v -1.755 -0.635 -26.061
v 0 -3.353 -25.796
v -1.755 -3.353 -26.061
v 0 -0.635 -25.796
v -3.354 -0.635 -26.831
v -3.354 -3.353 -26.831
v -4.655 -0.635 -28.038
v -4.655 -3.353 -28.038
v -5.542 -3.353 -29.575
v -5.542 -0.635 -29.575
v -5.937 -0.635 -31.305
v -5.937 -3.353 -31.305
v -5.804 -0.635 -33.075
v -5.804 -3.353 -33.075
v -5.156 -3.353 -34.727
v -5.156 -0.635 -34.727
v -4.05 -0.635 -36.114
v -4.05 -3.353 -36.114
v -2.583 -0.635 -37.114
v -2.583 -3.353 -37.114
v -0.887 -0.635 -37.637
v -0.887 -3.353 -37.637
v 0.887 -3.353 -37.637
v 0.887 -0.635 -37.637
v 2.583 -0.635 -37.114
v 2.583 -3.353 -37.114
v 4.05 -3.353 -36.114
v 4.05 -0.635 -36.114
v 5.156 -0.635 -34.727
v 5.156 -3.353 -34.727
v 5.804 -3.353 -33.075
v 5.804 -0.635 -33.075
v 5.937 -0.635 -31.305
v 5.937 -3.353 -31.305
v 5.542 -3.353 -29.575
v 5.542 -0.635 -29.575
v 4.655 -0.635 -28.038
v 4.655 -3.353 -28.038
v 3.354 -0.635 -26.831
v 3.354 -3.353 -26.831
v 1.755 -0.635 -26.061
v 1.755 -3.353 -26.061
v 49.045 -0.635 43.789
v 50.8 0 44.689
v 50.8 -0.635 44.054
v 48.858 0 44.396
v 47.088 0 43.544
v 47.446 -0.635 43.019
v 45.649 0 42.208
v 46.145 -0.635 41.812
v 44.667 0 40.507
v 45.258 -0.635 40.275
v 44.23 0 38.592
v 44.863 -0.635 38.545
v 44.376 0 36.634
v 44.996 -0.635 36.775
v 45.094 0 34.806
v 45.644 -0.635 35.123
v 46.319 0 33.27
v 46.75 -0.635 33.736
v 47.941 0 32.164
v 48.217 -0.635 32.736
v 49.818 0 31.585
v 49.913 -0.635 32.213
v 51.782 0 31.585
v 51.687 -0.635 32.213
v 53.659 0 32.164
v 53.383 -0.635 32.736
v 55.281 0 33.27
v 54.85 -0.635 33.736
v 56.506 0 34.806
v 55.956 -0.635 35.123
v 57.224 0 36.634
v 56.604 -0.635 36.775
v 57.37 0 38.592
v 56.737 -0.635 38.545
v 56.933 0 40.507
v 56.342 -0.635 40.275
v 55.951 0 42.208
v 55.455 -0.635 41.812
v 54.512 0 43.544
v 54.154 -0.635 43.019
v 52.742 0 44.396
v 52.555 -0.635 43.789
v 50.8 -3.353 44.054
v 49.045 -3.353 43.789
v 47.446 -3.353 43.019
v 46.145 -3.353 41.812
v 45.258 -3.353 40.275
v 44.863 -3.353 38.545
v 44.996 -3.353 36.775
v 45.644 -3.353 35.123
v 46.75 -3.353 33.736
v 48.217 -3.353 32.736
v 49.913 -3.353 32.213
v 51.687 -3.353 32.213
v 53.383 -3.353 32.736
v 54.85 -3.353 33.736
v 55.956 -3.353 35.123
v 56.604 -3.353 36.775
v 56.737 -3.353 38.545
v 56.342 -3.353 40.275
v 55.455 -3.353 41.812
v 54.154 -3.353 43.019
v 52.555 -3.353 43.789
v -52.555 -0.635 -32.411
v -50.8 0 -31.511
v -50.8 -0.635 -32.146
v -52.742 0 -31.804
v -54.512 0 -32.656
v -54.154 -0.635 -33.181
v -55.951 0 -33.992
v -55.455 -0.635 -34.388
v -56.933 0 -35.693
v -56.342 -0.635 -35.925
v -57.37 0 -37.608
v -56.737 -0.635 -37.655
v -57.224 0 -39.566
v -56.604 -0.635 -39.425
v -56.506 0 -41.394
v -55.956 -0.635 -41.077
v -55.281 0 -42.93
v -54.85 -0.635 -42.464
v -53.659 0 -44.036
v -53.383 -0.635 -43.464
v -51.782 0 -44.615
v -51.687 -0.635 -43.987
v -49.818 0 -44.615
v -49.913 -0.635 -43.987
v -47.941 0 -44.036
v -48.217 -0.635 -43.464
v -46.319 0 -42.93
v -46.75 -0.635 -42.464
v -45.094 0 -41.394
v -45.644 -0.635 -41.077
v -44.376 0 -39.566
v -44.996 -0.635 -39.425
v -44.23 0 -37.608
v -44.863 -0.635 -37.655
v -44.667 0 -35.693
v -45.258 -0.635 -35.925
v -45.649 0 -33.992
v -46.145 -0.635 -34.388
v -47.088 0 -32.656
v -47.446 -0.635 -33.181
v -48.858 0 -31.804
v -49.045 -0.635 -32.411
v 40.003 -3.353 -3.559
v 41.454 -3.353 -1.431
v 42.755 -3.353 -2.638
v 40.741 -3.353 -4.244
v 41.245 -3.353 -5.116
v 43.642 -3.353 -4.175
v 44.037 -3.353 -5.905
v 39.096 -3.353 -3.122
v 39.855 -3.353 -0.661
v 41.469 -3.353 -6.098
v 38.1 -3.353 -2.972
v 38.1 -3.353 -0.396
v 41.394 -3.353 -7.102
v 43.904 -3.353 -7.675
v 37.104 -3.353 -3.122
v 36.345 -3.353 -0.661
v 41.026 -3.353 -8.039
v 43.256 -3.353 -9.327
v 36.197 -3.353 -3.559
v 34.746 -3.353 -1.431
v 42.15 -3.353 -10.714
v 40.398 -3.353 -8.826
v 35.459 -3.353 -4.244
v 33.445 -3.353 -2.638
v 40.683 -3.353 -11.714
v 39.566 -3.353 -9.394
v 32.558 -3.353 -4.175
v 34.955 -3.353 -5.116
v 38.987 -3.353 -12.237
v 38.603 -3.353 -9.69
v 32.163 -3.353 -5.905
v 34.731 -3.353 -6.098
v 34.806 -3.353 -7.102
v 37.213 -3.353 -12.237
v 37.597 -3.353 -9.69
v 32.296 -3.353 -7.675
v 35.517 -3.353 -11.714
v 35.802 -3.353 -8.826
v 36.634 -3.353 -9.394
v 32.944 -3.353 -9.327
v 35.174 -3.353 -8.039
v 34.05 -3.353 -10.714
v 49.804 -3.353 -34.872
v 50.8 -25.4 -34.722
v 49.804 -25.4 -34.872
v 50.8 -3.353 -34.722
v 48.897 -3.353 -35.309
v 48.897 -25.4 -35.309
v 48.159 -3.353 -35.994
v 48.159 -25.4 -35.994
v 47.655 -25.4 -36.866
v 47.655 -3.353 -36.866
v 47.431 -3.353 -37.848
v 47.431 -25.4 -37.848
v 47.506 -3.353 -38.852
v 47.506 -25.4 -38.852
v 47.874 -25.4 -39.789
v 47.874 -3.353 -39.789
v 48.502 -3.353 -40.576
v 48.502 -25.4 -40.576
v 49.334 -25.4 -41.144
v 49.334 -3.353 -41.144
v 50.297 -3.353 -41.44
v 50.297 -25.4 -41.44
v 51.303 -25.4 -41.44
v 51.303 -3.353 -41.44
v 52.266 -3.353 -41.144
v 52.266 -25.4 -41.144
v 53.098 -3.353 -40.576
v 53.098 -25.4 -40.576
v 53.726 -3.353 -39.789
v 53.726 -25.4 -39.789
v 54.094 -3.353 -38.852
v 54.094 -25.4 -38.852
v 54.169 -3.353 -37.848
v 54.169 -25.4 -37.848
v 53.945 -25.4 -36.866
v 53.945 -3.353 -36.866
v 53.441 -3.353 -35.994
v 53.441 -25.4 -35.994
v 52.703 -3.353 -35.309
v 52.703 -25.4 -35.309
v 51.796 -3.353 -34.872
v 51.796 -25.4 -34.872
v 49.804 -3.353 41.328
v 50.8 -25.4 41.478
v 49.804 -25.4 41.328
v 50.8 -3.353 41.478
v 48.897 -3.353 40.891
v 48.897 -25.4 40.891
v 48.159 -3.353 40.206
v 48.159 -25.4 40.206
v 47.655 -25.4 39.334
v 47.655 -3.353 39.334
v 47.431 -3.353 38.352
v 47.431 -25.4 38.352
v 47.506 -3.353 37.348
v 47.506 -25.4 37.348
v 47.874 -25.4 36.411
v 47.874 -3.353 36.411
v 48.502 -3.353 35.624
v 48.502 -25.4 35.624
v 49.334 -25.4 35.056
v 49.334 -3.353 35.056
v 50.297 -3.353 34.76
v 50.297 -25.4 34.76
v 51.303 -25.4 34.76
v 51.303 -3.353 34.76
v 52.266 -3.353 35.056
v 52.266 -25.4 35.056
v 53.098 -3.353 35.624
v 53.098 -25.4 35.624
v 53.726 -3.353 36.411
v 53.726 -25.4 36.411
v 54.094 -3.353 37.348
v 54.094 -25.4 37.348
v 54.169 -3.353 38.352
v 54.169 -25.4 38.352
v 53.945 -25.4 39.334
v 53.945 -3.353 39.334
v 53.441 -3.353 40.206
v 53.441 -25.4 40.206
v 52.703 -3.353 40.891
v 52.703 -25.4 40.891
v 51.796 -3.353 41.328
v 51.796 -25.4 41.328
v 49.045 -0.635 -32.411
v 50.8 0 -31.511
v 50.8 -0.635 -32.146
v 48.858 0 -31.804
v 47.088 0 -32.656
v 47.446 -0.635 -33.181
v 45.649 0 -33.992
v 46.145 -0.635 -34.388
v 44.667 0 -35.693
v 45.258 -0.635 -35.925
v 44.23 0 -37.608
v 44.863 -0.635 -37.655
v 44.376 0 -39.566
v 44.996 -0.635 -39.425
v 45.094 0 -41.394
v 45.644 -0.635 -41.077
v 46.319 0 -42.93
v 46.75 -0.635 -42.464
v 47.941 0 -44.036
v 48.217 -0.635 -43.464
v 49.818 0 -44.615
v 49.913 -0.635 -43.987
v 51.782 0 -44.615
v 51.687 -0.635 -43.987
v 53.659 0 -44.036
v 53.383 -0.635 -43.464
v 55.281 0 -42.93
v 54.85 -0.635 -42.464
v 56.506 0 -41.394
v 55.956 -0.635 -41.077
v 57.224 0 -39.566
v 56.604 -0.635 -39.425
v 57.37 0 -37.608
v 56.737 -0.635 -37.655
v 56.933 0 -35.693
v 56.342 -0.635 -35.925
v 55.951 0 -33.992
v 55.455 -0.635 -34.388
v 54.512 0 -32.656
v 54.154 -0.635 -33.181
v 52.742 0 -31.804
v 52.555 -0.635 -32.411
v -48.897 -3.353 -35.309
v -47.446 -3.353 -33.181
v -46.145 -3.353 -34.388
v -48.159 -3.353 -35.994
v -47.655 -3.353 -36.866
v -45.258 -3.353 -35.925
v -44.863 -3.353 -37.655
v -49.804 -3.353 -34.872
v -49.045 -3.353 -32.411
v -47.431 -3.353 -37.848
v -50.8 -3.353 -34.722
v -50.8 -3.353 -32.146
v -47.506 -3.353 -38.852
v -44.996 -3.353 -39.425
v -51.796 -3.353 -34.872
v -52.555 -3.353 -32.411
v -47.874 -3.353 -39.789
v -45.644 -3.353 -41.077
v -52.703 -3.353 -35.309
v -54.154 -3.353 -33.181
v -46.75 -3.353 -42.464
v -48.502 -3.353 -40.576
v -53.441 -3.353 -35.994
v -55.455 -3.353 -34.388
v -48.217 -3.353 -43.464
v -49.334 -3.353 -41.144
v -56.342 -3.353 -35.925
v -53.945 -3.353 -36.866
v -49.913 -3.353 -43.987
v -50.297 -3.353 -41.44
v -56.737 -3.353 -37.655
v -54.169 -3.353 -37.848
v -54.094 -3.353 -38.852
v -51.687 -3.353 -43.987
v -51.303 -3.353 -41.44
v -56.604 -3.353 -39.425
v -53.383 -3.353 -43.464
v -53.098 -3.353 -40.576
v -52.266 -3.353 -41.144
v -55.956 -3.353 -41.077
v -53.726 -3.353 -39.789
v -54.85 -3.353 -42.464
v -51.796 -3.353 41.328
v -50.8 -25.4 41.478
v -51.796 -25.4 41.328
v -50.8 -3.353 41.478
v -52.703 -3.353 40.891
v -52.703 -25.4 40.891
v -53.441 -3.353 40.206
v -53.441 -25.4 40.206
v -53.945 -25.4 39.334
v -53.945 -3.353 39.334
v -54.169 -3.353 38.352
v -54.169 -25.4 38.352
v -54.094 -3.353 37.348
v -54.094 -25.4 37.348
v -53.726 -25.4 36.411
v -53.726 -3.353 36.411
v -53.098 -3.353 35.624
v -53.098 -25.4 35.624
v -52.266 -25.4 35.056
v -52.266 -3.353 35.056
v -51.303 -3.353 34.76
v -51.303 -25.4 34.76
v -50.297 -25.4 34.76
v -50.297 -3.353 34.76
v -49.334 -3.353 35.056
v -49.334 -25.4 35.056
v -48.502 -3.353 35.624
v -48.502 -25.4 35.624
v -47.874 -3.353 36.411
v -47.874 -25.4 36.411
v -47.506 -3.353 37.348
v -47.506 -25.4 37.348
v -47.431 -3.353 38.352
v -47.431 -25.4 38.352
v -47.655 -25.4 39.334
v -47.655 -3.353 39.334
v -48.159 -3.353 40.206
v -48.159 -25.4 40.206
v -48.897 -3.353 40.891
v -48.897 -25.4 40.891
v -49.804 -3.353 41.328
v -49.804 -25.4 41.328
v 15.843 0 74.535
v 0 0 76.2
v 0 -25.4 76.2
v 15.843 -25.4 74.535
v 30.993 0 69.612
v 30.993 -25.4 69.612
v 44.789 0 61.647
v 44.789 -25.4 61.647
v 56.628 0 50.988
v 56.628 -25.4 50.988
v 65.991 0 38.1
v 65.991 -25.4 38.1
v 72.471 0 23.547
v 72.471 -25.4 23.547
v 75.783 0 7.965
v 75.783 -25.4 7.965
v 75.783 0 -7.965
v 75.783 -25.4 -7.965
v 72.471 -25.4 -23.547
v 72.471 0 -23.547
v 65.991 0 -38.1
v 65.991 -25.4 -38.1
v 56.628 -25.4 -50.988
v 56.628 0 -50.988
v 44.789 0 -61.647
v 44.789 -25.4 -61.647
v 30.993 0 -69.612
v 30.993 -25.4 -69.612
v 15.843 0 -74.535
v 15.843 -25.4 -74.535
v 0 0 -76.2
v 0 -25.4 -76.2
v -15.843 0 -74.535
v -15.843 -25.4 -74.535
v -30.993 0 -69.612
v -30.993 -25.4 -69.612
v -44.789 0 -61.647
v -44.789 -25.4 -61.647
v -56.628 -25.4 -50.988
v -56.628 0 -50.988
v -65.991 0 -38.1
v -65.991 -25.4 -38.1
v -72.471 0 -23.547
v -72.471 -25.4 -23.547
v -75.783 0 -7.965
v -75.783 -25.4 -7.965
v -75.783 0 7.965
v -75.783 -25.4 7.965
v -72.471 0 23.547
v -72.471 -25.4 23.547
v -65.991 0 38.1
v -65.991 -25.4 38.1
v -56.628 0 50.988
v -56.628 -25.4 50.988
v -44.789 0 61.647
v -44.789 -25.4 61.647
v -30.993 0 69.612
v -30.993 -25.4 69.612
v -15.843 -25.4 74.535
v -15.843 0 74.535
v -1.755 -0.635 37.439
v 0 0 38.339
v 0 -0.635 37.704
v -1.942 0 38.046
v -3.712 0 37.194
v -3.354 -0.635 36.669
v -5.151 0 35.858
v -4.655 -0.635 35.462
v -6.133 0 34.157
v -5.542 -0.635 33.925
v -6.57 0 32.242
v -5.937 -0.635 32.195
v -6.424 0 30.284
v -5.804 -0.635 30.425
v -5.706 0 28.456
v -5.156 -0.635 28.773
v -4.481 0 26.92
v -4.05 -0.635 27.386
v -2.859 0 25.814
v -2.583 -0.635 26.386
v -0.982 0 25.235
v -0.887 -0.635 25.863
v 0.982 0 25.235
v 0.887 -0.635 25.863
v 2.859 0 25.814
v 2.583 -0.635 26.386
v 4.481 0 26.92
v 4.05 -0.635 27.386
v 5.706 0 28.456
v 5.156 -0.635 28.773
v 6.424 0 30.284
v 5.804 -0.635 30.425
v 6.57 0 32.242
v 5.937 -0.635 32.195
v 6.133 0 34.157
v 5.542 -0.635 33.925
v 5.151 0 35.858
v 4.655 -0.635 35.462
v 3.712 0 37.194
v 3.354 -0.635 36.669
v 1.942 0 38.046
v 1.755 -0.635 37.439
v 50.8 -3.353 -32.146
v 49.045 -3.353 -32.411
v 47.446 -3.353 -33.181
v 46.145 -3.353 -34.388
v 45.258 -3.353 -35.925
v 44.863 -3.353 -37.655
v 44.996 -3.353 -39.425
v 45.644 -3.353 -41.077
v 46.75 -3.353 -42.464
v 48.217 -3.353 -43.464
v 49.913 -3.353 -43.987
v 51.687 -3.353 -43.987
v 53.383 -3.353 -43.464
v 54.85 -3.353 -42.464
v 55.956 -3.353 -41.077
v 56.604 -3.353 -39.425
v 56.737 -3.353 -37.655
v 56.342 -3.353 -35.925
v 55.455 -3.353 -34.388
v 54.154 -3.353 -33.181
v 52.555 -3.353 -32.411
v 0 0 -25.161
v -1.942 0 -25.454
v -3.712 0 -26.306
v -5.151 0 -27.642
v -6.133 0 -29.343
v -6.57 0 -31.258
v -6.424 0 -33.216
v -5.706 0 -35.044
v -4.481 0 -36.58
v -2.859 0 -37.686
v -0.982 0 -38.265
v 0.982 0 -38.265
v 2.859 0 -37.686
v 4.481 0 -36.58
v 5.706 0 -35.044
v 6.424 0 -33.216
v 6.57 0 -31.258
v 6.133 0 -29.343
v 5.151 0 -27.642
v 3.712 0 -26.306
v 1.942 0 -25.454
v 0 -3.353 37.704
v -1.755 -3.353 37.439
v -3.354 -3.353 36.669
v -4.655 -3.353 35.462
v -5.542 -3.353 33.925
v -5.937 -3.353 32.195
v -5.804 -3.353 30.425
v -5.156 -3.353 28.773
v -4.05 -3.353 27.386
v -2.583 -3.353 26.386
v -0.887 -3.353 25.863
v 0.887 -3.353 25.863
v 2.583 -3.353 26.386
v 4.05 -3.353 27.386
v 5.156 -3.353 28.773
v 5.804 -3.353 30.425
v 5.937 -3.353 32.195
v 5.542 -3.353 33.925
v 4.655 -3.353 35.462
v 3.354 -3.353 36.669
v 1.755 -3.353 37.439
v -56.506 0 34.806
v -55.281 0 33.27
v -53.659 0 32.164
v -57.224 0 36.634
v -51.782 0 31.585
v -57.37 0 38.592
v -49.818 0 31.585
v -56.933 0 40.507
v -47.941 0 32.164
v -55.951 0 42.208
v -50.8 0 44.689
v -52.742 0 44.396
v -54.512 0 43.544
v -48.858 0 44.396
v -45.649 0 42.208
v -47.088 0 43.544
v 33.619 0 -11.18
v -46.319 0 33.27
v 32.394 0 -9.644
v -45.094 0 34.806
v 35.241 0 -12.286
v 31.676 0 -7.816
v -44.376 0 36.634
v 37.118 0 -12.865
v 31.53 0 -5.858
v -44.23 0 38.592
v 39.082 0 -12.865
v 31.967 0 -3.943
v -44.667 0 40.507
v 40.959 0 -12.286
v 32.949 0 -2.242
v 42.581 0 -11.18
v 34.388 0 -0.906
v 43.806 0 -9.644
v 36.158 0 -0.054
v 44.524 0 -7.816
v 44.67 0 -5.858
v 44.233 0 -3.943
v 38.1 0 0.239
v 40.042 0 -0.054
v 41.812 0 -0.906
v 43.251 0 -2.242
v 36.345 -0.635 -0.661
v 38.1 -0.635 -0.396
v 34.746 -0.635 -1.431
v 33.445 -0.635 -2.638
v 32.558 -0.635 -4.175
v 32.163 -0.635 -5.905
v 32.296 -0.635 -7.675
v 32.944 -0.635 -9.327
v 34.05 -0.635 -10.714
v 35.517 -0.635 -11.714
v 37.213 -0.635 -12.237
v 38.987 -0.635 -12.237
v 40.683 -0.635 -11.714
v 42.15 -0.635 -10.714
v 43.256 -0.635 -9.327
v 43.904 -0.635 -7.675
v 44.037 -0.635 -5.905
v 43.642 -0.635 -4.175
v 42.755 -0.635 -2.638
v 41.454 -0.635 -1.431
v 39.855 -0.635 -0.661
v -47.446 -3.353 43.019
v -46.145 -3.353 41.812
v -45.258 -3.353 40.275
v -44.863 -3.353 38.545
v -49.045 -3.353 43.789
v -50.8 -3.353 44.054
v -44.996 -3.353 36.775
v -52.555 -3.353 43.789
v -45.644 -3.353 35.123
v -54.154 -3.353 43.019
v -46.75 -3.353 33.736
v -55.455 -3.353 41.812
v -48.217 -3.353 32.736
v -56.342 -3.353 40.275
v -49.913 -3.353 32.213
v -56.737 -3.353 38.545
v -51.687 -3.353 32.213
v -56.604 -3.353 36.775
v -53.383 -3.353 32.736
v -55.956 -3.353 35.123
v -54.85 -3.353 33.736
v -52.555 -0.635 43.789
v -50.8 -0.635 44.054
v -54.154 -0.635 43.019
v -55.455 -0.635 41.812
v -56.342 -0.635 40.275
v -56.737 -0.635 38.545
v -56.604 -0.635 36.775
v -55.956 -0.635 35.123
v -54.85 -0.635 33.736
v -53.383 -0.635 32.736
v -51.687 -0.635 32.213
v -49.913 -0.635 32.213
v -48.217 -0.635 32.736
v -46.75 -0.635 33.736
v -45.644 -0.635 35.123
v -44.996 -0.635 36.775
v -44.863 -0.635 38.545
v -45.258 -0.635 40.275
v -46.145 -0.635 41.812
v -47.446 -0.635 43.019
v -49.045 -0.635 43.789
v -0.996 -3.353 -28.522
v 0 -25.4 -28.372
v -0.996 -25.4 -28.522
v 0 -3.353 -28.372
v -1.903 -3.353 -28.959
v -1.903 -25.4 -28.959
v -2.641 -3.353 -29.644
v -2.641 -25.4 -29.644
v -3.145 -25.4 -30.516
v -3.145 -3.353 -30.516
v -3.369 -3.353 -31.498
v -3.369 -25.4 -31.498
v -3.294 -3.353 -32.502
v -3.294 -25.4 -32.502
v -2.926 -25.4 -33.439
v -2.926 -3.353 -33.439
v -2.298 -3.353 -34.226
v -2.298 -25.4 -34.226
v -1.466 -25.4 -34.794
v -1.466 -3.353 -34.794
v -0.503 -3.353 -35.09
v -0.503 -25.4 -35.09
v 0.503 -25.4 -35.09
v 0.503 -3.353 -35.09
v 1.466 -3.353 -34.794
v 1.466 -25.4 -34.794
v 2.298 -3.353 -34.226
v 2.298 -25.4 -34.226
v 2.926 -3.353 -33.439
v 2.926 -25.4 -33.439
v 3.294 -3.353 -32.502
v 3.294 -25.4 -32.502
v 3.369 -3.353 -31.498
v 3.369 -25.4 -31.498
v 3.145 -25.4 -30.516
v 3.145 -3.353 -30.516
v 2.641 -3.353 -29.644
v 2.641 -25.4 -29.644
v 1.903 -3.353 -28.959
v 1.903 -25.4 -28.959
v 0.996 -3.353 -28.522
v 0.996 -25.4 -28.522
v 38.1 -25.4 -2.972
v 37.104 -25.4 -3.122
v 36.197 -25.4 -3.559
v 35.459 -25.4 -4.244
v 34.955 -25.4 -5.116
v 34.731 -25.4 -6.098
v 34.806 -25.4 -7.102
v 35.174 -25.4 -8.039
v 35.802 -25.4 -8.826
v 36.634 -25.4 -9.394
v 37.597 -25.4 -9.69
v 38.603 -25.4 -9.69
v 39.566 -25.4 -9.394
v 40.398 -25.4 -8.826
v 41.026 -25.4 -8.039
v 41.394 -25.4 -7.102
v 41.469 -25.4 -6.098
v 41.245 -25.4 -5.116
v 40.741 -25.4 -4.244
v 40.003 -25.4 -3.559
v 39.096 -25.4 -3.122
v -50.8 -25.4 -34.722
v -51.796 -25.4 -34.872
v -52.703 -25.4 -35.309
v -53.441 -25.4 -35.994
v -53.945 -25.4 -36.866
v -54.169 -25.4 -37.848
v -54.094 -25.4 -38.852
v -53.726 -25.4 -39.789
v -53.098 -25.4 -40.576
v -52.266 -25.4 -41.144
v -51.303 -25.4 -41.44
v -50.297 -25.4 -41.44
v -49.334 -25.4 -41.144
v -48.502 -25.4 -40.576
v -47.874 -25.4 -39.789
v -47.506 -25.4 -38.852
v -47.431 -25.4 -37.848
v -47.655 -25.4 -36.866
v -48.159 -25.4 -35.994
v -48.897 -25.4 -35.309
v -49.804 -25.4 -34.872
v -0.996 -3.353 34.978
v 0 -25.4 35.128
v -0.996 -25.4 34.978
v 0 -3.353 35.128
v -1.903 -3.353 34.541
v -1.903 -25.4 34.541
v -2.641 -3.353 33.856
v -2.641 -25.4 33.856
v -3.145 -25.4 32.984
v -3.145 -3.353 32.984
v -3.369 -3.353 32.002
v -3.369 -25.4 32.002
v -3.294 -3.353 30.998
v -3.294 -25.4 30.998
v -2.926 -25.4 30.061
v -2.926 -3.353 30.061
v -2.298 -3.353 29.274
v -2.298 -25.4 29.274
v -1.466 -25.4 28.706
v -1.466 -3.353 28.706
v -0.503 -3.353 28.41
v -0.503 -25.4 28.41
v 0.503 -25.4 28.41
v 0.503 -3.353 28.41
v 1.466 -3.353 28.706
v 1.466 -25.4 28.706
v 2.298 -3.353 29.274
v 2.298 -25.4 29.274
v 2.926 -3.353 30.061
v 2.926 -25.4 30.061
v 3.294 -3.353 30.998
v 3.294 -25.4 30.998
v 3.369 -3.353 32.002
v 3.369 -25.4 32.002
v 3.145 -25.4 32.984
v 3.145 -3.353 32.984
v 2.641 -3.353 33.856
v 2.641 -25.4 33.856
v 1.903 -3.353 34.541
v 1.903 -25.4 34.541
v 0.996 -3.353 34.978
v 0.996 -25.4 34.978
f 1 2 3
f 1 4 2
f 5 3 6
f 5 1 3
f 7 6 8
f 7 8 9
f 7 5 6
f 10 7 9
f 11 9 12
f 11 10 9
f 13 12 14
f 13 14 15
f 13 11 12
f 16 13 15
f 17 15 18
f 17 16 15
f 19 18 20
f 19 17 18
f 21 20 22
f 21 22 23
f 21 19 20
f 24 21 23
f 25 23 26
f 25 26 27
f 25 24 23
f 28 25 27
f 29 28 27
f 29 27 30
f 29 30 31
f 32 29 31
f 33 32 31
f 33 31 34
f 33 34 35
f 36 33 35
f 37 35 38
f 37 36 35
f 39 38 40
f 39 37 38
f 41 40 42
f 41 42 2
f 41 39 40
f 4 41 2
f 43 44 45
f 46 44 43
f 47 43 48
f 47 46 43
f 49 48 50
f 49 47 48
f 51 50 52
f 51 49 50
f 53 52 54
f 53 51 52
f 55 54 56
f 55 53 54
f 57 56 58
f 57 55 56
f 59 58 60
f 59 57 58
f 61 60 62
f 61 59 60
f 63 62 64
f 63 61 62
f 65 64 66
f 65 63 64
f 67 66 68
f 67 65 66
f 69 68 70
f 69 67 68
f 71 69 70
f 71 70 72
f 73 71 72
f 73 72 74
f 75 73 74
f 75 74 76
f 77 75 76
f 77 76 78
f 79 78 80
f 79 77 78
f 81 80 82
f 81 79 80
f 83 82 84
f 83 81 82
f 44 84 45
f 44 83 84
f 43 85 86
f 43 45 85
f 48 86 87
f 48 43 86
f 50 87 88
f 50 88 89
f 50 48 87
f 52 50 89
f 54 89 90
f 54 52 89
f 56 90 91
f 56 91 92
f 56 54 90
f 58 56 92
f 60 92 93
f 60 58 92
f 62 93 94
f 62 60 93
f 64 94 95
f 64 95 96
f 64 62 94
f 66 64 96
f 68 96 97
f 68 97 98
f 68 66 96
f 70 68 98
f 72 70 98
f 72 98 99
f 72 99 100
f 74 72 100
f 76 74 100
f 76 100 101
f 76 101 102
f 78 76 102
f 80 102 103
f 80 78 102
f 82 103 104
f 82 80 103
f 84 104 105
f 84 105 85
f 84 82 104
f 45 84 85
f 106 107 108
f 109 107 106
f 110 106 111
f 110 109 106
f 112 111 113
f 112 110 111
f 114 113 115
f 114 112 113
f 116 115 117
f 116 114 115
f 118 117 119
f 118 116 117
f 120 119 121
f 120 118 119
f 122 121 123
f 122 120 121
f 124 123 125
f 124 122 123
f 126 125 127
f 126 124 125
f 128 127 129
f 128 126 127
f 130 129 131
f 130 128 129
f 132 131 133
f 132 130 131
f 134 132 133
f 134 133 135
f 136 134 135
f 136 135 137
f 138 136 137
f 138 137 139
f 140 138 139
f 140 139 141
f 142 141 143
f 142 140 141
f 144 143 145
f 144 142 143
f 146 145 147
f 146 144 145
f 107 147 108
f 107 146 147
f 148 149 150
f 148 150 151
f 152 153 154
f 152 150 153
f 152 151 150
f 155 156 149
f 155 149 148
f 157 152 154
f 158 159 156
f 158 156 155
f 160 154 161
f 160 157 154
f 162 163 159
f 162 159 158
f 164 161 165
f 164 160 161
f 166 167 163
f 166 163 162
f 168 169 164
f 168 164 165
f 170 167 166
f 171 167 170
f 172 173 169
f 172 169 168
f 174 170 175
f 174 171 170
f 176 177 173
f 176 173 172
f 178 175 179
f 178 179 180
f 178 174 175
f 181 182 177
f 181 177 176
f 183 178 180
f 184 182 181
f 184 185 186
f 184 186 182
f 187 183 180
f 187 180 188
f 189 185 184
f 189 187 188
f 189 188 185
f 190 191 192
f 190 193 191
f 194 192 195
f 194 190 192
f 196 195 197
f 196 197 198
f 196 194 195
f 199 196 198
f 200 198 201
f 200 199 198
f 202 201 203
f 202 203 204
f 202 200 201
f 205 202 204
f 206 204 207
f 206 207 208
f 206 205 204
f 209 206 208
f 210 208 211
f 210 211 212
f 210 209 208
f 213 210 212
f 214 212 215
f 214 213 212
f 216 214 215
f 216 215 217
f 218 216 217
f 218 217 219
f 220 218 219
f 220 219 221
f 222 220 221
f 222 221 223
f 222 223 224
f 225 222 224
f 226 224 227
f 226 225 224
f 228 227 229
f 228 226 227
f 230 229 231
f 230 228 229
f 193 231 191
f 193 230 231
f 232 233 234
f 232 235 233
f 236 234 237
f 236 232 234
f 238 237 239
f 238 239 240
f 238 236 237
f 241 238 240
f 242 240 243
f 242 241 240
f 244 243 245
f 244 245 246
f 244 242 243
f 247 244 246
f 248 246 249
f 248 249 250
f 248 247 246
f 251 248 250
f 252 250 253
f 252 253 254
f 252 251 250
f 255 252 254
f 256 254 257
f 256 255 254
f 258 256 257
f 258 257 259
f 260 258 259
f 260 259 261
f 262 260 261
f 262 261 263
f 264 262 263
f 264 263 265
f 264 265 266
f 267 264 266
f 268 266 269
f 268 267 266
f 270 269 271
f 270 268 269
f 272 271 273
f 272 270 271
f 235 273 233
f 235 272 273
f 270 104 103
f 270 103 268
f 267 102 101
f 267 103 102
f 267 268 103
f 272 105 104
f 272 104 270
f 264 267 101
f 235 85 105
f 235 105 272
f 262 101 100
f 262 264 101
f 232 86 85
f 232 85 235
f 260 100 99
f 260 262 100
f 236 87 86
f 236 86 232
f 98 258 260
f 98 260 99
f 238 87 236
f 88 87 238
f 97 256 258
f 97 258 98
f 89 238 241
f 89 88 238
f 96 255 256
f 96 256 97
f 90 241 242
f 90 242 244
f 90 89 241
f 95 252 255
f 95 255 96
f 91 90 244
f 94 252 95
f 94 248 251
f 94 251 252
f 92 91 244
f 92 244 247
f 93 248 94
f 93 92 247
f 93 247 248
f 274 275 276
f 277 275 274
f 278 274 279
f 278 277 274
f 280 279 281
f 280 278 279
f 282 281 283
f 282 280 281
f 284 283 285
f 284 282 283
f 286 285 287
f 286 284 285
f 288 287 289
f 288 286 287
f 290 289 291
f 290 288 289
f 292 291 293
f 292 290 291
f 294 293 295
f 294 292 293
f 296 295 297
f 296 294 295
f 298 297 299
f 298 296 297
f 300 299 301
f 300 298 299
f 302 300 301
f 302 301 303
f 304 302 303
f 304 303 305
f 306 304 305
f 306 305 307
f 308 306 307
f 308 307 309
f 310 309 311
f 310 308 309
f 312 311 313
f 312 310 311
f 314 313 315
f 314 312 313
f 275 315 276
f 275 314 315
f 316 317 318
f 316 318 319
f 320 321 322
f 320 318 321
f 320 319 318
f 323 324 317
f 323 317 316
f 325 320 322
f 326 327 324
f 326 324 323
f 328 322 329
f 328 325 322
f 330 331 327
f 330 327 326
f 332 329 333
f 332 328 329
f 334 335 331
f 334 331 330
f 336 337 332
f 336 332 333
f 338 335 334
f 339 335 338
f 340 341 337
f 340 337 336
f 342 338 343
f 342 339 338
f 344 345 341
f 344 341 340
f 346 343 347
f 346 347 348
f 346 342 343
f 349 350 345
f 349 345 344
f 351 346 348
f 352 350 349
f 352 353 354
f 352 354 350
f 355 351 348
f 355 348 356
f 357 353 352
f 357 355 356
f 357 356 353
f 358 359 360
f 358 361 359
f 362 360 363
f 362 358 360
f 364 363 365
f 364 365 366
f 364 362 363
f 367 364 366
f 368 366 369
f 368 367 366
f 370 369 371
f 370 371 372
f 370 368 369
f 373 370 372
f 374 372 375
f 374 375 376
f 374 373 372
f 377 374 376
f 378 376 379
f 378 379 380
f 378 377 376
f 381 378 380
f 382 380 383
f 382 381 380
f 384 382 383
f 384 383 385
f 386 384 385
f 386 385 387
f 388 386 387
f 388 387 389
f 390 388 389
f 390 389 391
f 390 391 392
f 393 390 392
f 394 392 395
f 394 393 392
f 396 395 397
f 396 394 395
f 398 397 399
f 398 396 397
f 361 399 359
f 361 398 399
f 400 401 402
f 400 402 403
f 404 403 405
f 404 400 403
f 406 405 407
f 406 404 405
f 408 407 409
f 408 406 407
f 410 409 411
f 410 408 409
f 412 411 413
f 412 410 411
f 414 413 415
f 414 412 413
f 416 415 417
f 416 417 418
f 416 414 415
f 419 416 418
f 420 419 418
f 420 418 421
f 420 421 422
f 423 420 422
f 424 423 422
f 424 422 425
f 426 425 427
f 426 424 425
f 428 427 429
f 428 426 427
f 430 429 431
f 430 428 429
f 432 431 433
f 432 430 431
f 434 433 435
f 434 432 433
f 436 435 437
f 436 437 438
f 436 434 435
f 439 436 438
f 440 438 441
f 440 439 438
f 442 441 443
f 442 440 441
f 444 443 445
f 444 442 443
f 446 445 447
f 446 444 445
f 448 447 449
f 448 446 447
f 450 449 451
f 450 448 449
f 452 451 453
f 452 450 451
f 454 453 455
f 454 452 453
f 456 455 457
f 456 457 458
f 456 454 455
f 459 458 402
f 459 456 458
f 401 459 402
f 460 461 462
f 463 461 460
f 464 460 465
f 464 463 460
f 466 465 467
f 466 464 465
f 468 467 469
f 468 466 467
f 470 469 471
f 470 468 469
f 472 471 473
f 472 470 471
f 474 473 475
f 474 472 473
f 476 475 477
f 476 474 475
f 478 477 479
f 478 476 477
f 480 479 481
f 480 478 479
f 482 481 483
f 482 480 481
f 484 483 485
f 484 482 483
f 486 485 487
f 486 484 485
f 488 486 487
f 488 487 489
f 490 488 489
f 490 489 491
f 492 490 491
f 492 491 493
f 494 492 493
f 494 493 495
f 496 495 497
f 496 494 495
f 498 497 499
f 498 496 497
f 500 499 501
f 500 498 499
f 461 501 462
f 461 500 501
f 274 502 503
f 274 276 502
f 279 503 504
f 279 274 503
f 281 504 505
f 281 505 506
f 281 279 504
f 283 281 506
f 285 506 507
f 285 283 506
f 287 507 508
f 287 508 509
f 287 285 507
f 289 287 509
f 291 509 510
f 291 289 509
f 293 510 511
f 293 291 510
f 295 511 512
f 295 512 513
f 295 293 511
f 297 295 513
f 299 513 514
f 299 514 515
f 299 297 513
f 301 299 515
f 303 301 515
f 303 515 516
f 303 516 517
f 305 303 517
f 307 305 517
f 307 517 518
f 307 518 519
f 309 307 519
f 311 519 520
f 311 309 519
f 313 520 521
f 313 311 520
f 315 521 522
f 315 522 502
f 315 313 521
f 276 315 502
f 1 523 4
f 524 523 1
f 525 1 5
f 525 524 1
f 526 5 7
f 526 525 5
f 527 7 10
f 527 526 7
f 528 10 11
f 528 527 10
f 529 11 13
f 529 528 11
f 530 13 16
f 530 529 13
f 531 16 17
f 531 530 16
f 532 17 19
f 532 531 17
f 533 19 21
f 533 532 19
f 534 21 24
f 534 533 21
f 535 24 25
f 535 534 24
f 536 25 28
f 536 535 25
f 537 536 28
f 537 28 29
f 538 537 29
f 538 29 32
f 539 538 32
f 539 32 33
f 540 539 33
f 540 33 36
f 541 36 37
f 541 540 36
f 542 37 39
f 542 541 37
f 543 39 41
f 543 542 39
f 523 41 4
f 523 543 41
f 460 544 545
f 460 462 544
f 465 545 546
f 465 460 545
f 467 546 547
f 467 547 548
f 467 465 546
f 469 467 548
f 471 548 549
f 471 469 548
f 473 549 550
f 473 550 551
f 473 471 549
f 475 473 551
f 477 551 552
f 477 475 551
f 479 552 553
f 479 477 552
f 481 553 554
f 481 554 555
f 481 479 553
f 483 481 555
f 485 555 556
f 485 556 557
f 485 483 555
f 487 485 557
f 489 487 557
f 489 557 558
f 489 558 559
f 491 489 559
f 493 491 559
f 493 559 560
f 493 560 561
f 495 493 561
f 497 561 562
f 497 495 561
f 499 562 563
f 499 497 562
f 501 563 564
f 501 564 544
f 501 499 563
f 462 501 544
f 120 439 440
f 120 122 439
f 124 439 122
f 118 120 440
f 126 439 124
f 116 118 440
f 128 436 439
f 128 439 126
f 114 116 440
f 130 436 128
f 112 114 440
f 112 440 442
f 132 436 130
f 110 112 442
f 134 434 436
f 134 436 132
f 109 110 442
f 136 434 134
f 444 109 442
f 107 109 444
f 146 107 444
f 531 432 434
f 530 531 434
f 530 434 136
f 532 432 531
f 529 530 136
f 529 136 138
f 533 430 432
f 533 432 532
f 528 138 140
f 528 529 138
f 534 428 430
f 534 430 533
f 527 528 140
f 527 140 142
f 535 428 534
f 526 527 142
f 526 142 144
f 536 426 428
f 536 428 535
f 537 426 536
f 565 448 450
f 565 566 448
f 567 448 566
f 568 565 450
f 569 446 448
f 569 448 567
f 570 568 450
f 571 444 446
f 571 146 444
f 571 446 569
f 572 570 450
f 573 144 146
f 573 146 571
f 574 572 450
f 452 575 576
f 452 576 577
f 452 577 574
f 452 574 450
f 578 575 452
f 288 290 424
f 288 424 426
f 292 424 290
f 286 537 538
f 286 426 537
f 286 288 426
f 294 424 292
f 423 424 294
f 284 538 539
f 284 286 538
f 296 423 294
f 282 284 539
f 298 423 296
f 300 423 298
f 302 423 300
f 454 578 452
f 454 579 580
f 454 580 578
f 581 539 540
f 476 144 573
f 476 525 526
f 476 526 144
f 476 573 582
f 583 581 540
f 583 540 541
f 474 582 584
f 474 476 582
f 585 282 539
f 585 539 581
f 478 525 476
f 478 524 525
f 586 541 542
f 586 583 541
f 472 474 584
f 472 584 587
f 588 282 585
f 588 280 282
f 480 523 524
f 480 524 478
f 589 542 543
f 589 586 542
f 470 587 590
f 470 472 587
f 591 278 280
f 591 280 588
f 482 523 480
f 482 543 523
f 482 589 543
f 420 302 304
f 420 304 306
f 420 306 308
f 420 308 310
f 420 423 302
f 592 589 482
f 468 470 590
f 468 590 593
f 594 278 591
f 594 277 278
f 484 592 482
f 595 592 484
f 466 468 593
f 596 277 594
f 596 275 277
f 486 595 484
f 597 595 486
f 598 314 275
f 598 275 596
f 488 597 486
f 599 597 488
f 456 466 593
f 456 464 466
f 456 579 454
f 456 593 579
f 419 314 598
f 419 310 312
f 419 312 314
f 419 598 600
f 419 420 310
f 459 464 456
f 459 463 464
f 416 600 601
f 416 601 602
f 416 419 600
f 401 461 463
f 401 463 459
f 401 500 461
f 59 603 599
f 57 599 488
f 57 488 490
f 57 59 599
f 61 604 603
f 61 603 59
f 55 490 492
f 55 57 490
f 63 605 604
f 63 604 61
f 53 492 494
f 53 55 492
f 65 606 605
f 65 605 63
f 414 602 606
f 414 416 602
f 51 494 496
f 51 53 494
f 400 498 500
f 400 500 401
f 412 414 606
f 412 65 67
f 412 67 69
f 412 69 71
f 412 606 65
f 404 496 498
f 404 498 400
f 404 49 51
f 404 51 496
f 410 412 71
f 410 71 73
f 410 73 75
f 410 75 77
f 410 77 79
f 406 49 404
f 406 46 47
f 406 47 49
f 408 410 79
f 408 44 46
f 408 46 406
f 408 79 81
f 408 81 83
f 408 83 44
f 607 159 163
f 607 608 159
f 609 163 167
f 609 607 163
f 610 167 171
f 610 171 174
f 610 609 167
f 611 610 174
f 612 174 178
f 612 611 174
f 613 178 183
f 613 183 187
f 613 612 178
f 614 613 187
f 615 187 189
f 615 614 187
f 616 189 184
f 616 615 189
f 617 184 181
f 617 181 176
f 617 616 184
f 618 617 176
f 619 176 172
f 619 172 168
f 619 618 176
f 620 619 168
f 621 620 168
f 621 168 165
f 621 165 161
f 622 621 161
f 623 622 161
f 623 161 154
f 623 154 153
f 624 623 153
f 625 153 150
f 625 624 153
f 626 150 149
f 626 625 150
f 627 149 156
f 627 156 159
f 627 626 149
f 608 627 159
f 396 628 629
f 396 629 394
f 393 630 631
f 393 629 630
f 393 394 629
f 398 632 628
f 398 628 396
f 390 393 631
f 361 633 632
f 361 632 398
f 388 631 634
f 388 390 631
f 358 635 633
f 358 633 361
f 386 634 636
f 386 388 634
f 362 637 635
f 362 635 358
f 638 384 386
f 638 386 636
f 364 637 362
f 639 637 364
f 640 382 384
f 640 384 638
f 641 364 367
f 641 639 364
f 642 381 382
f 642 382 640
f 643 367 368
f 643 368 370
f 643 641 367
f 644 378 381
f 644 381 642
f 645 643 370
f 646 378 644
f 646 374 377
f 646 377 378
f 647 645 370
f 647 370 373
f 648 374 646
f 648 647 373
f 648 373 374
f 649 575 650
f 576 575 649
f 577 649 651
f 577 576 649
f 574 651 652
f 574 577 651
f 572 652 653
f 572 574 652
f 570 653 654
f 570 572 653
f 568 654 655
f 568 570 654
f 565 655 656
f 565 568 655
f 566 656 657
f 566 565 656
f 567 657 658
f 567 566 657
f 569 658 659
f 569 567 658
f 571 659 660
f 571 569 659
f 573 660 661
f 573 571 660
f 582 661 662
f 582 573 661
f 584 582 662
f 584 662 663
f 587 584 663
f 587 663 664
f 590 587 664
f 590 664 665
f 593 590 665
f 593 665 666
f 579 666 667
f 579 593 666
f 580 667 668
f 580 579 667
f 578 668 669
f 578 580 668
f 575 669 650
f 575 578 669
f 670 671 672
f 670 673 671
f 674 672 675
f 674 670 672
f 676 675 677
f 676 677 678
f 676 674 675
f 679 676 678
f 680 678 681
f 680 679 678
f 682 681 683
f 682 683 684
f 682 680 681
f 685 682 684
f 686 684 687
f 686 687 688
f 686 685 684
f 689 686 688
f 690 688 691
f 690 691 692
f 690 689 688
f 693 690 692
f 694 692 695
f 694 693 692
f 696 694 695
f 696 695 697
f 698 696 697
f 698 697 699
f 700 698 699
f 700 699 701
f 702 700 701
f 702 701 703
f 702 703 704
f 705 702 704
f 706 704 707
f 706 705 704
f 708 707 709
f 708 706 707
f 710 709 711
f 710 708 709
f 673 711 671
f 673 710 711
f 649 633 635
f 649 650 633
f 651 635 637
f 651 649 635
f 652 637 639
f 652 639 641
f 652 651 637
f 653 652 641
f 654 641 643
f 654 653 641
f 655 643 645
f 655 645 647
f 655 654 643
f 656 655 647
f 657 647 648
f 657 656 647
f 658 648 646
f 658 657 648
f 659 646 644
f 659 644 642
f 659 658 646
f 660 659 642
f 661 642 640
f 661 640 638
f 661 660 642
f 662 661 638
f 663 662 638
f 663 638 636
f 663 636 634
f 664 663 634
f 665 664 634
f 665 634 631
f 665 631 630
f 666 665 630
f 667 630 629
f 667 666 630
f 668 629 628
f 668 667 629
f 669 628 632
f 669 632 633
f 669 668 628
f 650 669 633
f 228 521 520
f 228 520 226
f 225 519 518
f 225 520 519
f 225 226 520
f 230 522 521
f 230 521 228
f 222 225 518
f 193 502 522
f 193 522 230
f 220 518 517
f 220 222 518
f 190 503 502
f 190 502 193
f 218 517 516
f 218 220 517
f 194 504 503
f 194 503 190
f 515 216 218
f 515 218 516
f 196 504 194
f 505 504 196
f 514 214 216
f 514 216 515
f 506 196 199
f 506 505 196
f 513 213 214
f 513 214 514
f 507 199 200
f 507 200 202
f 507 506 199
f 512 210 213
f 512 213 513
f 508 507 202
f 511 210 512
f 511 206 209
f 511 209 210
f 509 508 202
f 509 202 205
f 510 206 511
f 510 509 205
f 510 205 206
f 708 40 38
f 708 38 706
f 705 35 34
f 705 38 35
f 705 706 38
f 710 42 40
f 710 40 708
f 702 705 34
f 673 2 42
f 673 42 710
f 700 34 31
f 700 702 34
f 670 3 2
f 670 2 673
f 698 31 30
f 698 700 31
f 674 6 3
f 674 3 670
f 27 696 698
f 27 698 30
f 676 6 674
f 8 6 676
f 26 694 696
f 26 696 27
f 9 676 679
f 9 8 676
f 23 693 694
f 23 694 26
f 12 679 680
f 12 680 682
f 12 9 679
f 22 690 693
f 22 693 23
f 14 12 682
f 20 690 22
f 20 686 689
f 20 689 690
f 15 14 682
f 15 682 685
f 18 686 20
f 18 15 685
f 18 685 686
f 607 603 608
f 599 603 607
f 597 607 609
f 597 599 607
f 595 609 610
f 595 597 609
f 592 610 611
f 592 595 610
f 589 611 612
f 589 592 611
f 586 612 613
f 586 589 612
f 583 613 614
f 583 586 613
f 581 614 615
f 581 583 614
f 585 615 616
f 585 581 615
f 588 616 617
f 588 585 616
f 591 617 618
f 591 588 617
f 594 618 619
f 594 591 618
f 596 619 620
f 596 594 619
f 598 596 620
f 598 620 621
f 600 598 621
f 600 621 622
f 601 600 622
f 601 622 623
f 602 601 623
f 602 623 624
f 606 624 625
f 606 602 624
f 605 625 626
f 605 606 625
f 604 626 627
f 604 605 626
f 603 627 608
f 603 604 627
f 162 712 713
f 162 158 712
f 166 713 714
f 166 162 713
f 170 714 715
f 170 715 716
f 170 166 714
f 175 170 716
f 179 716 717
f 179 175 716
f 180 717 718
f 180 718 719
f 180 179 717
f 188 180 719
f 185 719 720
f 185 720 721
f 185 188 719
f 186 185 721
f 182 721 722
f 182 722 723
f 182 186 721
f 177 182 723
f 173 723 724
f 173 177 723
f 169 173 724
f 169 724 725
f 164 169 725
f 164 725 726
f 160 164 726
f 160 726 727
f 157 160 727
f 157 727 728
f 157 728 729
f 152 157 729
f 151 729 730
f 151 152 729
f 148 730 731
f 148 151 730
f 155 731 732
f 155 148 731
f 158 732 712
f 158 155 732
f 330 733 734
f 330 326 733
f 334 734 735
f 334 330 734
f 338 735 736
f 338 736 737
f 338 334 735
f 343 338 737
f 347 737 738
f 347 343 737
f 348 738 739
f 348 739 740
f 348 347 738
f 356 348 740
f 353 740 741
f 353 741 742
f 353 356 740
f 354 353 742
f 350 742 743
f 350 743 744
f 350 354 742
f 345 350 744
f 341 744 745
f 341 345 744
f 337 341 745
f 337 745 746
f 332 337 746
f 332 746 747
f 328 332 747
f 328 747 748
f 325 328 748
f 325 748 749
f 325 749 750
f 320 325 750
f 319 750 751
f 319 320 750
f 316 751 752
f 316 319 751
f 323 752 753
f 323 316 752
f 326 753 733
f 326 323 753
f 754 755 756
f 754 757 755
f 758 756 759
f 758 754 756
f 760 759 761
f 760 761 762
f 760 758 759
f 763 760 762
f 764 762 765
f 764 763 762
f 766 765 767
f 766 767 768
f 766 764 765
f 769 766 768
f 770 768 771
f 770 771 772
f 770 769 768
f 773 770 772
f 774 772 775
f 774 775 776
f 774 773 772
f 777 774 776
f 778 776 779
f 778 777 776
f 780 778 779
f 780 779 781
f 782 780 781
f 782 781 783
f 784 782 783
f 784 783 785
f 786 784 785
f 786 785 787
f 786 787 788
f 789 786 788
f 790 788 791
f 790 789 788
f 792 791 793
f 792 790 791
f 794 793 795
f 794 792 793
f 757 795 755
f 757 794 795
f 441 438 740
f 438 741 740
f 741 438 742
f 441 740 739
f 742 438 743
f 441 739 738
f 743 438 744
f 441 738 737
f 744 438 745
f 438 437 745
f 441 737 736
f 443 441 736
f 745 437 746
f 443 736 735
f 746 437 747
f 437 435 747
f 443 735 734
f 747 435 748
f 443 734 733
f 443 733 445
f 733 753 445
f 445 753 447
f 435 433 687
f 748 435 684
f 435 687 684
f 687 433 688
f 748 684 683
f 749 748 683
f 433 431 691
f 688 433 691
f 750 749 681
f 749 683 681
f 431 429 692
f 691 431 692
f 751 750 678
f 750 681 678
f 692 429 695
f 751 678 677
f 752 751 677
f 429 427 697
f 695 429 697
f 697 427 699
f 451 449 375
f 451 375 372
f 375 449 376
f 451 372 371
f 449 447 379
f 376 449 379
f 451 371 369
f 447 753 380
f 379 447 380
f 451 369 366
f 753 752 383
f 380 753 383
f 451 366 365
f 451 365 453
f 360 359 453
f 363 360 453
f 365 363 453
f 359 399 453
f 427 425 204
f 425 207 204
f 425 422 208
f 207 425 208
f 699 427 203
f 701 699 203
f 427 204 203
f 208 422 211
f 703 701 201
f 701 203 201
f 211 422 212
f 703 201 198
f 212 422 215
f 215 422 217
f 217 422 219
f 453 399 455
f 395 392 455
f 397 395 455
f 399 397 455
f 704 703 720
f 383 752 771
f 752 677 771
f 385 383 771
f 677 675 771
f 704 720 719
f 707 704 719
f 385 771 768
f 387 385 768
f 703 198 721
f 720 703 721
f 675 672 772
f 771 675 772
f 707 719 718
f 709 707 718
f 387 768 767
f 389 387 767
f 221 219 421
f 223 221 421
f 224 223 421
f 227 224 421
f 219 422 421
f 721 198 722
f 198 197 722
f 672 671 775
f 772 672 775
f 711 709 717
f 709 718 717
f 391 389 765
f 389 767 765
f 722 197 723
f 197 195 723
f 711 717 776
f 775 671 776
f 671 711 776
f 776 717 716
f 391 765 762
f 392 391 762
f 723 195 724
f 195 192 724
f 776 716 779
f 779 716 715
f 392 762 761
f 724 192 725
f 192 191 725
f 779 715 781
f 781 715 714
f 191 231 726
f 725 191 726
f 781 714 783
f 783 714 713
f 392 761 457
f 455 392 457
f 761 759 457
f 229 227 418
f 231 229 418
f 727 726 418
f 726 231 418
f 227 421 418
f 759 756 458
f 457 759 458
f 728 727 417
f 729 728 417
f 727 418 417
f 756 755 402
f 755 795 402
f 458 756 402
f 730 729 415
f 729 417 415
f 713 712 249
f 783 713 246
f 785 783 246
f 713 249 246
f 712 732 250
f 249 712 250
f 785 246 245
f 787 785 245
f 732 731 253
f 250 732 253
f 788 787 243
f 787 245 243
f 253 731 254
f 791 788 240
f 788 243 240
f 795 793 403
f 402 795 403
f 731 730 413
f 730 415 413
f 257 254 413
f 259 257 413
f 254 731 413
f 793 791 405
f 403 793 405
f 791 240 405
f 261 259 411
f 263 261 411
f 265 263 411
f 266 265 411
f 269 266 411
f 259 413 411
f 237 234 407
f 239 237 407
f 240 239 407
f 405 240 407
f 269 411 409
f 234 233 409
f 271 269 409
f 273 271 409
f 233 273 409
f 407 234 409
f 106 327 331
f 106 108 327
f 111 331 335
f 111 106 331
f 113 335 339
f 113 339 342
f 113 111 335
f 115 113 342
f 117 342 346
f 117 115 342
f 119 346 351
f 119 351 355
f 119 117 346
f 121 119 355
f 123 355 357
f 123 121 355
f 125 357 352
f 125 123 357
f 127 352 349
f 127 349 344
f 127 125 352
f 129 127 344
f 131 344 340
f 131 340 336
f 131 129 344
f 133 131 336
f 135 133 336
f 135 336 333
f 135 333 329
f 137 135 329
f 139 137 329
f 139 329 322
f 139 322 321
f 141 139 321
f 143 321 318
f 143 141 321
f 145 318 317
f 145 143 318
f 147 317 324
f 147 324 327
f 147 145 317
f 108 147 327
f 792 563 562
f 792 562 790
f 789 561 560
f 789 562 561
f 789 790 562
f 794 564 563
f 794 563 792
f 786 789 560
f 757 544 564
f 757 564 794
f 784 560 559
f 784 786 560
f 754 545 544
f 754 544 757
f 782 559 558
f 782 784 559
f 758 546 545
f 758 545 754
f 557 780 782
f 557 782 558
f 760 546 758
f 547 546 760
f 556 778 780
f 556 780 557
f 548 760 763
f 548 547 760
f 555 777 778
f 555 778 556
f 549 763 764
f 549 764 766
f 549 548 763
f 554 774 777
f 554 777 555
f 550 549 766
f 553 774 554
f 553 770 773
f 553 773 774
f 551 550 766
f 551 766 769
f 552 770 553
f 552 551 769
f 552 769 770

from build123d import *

# Parameters (mm, degrees)
SKETCH1_R                                     = 76.2
BOSS_EXTRUDE1_DEPTH                           = 25.4
CBORE_FOR_1_4_BUTTON_HEAD_CAP_SCREW1_AT_COUNT = 2
CBORE_FOR_1_4_BUTTON_HEAD_CAP_SCREW1_AT_PITCH = 45.790501198
CBORE_FOR_1_4_BUTTON_HEAD_CAP_SCREW1_2_COUNT  = 2
CBORE_FOR_1_4_BUTTON_HEAD_CAP_SCREW1_2_PITCH  = 63.5
CBORE_FOR_1_4_BUTTON_HEAD_CAP_SCREW1_3_COUNT  = 2
CBORE_FOR_1_4_BUTTON_HEAD_CAP_SCREW1_3_PITCH  = 86.36933773
CBORE_FOR_1_4_BUTTON_HEAD_CAP_SCREW1_4_COUNT  = 2
CBORE_FOR_1_4_BUTTON_HEAD_CAP_SCREW1_4_PITCH  = 51.195336702
CBORE_FOR_1_4_BUTTON_HEAD_CAP_SCREW1_5_COUNT  = 2
CBORE_FOR_1_4_BUTTON_HEAD_CAP_SCREW1_5_PITCH  = 51.195336702
CBORE_FOR_1_4_BUTTON_HEAD_CAP_SCREW1_6_COUNT  = 2
CBORE_FOR_1_4_BUTTON_HEAD_CAP_SCREW1_6_PITCH  = 86.36933773


with BuildPart() as part:
    # Sketch1 → Boss-Extrude1 (new body)
    with BuildSketch(Plane(origin=(0, 0, 0), x_dir=(1, 0, 0), z_dir=(0, 1, 0))):
        with Locations(Location((0, 0, 0), (0, 0, 270))):
            Circle(SKETCH1_R)
    extrude(amount=-BOSS_EXTRUDE1_DEPTH)

    # Sketch8 → CBORE for 1/4 Button Head Cap Screw1 (revolve, cut)
    with BuildSketch(Plane(origin=(0, 0, -31.75), x_dir=(0, 0, 1), z_dir=(1, 0, 0))):
        Polygon((0, 0), (0, 25.4), (3.3782, 25.4), (3.3782, 3.3528), (5.95376, 3.3528), (5.95376, 0.635), (6.58876, 0), align=None)
    cbore_for_1_4_button_head_cap_screw1 = revolve(axis=Axis((0, 6.35, -31.75), (0, -1, 0)), mode=Mode.SUBTRACT)

    # CBORE for 1/4 Button Head Cap Screw1 at: CBORE for 1/4 Button Head Cap Screw1 ×2
    with Locations(*[Vector(0.8320502943378437, 0, 0.5547001962252293) * (i * CBORE_FOR_1_4_BUTTON_HEAD_CAP_SCREW1_AT_PITCH) for i in range(1, CBORE_FOR_1_4_BUTTON_HEAD_CAP_SCREW1_AT_COUNT)]):
        add(cbore_for_1_4_button_head_cap_screw1, mode=Mode.SUBTRACT)

    # CBORE for 1_4 Button Head Cap Screw1 2: CBORE for 1/4 Button Head Cap Screw1 ×2
    with Locations(*[(0, 0, i * CBORE_FOR_1_4_BUTTON_HEAD_CAP_SCREW1_2_PITCH) for i in range(1, CBORE_FOR_1_4_BUTTON_HEAD_CAP_SCREW1_2_COUNT)]):
        add(cbore_for_1_4_button_head_cap_screw1, mode=Mode.SUBTRACT)

    # CBORE for 1_4 Button Head Cap Screw1 3: CBORE for 1/4 Button Head Cap Screw1 ×2
    with Locations(*[Vector(0.5881716976750462, 0, 0.8087360843031886) * (i * CBORE_FOR_1_4_BUTTON_HEAD_CAP_SCREW1_3_PITCH) for i in range(1, CBORE_FOR_1_4_BUTTON_HEAD_CAP_SCREW1_3_COUNT)]):
        add(cbore_for_1_4_button_head_cap_screw1, mode=Mode.SUBTRACT)

    # CBORE for 1_4 Button Head Cap Screw1 4: CBORE for 1/4 Button Head Cap Screw1 ×2
    with Locations(*[Vector(0.9922778767136676, 0, -0.12403473458920865) * (i * CBORE_FOR_1_4_BUTTON_HEAD_CAP_SCREW1_4_PITCH) for i in range(1, CBORE_FOR_1_4_BUTTON_HEAD_CAP_SCREW1_4_COUNT)]):
        add(cbore_for_1_4_button_head_cap_screw1, mode=Mode.SUBTRACT)

    # CBORE for 1_4 Button Head Cap Screw1 5: CBORE for 1/4 Button Head Cap Screw1 ×2
    with Locations(*[Vector(-0.9922778767136676, 0, -0.12403473458920862) * (i * CBORE_FOR_1_4_BUTTON_HEAD_CAP_SCREW1_5_PITCH) for i in range(1, CBORE_FOR_1_4_BUTTON_HEAD_CAP_SCREW1_5_COUNT)]):
        add(cbore_for_1_4_button_head_cap_screw1, mode=Mode.SUBTRACT)

    # CBORE for 1_4 Button Head Cap Screw1 6: CBORE for 1/4 Button Head Cap Screw1 ×2
    with Locations(*[Vector(-0.5881716976750463, 0, 0.8087360843031884) * (i * CBORE_FOR_1_4_BUTTON_HEAD_CAP_SCREW1_6_PITCH) for i in range(1, CBORE_FOR_1_4_BUTTON_HEAD_CAP_SCREW1_6_COUNT)]):
        add(cbore_for_1_4_button_head_cap_screw1, mode=Mode.SUBTRACT)


solid = part.part
